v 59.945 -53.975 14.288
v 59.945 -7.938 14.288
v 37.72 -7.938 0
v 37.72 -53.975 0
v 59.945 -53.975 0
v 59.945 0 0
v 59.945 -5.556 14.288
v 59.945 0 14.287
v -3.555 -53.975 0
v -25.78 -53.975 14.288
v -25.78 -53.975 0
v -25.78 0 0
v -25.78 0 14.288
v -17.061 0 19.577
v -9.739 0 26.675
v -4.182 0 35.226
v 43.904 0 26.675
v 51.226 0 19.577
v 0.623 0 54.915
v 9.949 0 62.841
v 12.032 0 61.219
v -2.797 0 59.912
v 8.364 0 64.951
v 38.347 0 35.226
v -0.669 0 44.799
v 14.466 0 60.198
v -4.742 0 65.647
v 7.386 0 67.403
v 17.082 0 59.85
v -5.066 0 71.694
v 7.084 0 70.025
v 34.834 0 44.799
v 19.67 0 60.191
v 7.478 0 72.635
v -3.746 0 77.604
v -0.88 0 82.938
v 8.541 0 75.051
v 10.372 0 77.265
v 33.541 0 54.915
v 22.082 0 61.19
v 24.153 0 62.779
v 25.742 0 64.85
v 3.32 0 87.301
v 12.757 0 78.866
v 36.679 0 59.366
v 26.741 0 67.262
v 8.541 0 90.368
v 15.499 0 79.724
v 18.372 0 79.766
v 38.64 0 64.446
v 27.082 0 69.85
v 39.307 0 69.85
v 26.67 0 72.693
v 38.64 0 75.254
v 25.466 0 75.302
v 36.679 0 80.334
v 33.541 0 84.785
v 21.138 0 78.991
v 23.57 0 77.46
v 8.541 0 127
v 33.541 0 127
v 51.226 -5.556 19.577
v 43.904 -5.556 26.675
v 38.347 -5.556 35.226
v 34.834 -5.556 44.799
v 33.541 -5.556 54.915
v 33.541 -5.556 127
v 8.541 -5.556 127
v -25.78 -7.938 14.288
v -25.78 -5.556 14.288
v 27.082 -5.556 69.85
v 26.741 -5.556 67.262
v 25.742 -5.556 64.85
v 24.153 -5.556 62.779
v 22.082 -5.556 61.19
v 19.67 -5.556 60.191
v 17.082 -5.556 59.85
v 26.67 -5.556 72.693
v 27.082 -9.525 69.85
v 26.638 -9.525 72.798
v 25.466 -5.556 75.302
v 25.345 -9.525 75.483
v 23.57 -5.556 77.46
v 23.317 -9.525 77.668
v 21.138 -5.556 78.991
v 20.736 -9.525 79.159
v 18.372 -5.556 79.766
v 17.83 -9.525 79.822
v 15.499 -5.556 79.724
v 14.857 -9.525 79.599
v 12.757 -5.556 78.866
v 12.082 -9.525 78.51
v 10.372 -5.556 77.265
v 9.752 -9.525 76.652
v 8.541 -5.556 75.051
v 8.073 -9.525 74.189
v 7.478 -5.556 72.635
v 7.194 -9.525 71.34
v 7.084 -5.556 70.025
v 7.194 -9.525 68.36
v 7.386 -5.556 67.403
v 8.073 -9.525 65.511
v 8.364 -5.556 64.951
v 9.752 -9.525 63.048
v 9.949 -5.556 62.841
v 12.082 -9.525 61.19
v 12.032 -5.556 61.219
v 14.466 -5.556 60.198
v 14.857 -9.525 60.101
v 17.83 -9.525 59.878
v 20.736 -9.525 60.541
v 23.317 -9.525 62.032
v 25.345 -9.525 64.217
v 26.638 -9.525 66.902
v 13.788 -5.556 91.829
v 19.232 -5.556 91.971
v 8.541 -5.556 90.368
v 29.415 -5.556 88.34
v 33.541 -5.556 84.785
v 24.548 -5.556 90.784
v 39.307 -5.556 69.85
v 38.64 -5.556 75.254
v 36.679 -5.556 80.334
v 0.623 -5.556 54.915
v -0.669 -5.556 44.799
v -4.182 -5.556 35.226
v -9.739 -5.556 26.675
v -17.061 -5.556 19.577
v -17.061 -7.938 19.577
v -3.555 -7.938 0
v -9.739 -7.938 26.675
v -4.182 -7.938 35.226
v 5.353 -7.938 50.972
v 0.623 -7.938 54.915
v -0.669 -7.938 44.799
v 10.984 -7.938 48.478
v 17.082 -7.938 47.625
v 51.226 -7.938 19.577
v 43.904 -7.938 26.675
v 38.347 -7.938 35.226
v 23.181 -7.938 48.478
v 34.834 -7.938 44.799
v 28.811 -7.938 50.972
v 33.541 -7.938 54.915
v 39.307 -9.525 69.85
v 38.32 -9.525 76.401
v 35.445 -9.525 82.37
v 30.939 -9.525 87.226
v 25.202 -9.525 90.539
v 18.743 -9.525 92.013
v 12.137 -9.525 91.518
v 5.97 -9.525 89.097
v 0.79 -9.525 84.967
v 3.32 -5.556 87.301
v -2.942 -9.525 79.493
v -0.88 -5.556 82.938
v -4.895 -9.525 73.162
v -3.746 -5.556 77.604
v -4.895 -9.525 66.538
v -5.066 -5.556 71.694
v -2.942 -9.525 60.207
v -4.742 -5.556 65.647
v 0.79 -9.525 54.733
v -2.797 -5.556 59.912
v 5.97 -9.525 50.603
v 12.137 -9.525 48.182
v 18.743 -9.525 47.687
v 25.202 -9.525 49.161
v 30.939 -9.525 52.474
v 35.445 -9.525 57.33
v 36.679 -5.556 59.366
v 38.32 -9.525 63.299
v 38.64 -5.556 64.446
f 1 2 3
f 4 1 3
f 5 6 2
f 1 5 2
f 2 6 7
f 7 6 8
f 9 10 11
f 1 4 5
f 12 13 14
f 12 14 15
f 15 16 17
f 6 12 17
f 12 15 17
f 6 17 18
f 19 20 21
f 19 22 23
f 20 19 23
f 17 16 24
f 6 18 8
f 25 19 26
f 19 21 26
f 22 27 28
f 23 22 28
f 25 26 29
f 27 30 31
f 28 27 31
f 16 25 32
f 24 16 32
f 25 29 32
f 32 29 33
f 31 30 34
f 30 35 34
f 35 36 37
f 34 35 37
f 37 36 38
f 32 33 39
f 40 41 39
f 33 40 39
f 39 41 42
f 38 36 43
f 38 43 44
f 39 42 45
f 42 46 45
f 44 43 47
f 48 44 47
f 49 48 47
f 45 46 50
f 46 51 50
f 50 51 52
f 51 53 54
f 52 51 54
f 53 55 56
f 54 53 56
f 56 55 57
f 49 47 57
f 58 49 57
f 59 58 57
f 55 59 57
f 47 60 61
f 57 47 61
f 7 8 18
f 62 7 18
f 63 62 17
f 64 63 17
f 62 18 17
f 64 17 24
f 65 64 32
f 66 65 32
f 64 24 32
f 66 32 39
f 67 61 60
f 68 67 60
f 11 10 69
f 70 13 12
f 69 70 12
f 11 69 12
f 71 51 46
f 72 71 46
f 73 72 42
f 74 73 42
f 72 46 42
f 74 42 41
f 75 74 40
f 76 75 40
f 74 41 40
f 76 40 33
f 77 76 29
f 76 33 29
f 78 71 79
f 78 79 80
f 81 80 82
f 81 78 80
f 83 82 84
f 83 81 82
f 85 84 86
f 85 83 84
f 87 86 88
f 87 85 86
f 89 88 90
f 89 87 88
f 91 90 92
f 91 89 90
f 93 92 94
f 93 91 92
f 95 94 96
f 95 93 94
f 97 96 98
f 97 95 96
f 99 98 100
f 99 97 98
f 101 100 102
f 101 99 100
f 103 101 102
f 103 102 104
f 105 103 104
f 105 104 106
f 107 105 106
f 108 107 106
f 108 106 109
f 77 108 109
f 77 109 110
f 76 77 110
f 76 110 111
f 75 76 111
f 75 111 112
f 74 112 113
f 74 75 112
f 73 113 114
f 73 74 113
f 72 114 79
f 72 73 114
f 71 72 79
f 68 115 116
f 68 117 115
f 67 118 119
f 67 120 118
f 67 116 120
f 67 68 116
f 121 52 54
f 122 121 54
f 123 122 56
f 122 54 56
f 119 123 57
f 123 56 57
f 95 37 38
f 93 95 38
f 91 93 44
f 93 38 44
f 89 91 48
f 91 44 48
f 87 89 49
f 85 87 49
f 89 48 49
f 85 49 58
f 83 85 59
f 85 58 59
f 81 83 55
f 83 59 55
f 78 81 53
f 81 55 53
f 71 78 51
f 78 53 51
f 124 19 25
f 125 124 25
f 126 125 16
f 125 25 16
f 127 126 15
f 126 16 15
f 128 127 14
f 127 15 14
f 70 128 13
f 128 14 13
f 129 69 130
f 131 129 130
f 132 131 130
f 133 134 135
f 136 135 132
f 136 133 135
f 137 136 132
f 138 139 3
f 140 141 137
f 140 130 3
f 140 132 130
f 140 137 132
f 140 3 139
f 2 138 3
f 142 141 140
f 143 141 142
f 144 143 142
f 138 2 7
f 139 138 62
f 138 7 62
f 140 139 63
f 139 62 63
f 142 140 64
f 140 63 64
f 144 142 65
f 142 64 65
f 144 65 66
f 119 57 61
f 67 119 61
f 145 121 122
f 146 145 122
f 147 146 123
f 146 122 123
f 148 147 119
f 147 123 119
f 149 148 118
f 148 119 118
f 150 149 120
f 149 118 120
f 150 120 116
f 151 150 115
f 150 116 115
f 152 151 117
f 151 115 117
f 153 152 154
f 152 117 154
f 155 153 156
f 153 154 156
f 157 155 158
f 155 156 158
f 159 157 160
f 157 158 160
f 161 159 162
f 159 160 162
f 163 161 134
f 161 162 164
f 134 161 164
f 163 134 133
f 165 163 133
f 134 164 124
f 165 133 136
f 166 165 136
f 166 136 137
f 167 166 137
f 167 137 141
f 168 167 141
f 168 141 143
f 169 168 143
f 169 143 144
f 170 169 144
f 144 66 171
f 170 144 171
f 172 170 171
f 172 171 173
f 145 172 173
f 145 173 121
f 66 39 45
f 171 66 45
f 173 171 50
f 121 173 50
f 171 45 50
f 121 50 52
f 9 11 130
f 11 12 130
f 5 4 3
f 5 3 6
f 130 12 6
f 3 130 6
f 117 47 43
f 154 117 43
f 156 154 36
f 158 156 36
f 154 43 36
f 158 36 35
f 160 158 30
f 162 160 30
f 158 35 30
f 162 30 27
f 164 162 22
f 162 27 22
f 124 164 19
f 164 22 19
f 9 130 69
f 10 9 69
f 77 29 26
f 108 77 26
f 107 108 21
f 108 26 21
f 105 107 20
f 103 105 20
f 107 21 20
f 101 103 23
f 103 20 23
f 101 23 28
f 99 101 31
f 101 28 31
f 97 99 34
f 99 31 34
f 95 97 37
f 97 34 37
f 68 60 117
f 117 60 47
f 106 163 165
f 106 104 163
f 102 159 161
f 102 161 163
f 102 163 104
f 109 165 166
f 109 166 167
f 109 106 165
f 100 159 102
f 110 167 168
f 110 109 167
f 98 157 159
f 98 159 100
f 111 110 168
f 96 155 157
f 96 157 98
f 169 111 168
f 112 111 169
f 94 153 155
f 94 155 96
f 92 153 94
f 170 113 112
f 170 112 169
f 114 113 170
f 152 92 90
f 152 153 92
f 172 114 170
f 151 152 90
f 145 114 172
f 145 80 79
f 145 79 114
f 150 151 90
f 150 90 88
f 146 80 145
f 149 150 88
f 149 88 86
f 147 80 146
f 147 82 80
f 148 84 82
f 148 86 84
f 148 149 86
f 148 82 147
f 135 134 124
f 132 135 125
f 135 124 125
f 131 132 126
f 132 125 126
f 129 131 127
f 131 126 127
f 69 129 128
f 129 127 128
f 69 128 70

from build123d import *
from build123d import SkipClean  # not in build123d's __all__

# Parameters (mm, degrees)
F1_DEPTH = 5.55625
F2_R     = 22.225
F2_R_2   = 10.0000054
F3_DEPTH = 3.96875
F5_DEPTH = 2.38125
F7_DEPTH = 46.0375


# Not quite as in the source:
# - after a boolean that leaves OpenCascade's solid faulty, fix() repairs it


with BuildPart() as f1:
    # F0 (on Front) → F1 (new body)
    with BuildSketch(Plane.XZ):
        with BuildLine():
            ThreePointArc((8.5411146283, 90.3682841852), (21.9263912189, 91.5406597383), (33.5411154283, 84.7850490788))
            Line((33.5411154283, 84.7850490788), (33.5411154283, 127))
            Line((33.5411154283, 127), (8.5411146283, 127))
            Line((8.5411146283, 127), (8.5411146283, 90.3682841852))
        make_face()
        with BuildLine():
            ThreePointArc((17.0822292566, 47.625), (26.0827614415, 49.5290491023), (33.5411154283, 54.9149509212))
            Line((33.5411154283, 54.9149509212), (33.5411154283, 84.7850490788))
            ThreePointArc((33.5411154283, 84.7850490788), (21.9263912189, 91.5406597383), (8.5411146283, 90.3682841852))
            Line((8.5411146283, 90.3682841852), (8.5411146283, 75.050910392))
            ThreePointArc((8.5411146283, 75.050910392), (19.7830546485, 79.4783773401), (27.0822346566, 69.85))
            ThreePointArc((27.0822346566, 69.85), (24.1533008869, 62.7789283698), (17.0822292566, 59.8499946))
            Line((17.0822292566, 59.8499946), (17.0822292566, 47.625))
        make_face()
        with BuildLine():
            ThreePointArc((0.6233430849, 54.9149509212), (8.0816970717, 49.5290491023), (17.0822292566, 47.625))
            Line((17.0822292566, 47.625), (17.0822292566, 59.8499946))
            ThreePointArc((17.0822292566, 59.8499946), (8.3641663982, 64.9514810404), (8.5411146283, 75.050910392))
            Line((8.5411146283, 75.050910392), (8.5411146283, 90.3682841852))
            ThreePointArc((8.5411146283, 90.3682841852), (-4.6084304817, 74.6941619623), (0.6233430849, 54.9149509212))
        make_face()
        with BuildLine():
            Line((33.5411154283, 84.7850490788), (33.5411154283, 54.9149509212))
            ThreePointArc((33.5411154283, 54.9149509212), (37.8156487788, 61.8452551623), (39.3072292566, 69.85))
            ThreePointArc((39.3072292566, 69.85), (37.8156487788, 77.8547448377), (33.5411154283, 84.7850490788))
        make_face()
        with BuildLine():
            Line((17.0822292566, 0), (17.0822292566, 47.625))
            ThreePointArc((17.0822292566, 47.625), (8.0816970717, 49.5290491023), (0.6233430849, 54.9149509212))
            ThreePointArc((0.6233430849, 54.9149509212), (-6.7205760102, 30.7942081775), (-25.7802707434, 14.2875))
            Line((-25.7802707434, 14.2875), (-25.7802707434, 0))
            Line((-25.7802707434, 0), (17.0822292566, 0))
        make_face()
        with BuildLine():
            Line((33.5411154283, 0), (33.5411154283, 54.9149509212))
            ThreePointArc((33.5411154283, 54.9149509212), (26.0827614415, 49.5290491023), (17.0822292566, 47.625))
            Line((17.0822292566, 47.625), (17.0822292566, 0))
            Line((17.0822292566, 0), (33.5411154283, 0))
        make_face()
        with BuildLine():
            ThreePointArc((59.9447292566, 14.2875), (40.8850345234, 30.7942081775), (33.5411154283, 54.9149509212))
            Line((33.5411154283, 54.9149509212), (33.5411154283, 0))
            Line((33.5411154283, 0), (59.9447292566, 0))
            Line((59.9447292566, 0), (59.9447292566, 14.2875))
        make_face()
    extrude(amount=F1_DEPTH)

    # F2 (on face) → F3 (join)
    with BuildSketch(Plane.XZ.offset(5.55625)):
        with Locations((17.0822292566, 69.85)):
            Circle(F2_R)
        with Locations((17.0822292566, 69.85)):
            Circle(F2_R_2, mode=Mode.SUBTRACT)
    with SkipClean():  # cleaning this boolean's faces spoils the solid; the shape is the same uncleaned
        extrude(amount=F3_DEPTH)

    # F3_face (on face) + F4 (on face) → F5 (join)
    with BuildSketch(Plane(origin=(17.0822292566, -5.55625, 20.2916476737), x_dir=(1, 0, 0), z_dir=(0, -1, 0))):
        with BuildLine():
            ThreePointArc((16.4588861717, 34.6233032475), (0, 27.3333523263), (-16.4588861717, 34.6233032475))
            ThreePointArc((-16.4588861717, 34.6233032475), (-23.8028052668, 10.5025605039), (-42.8625, -6.0041476737))
            Line((-42.8625, -6.0041476737), (-42.8625, -20.2916476737))
            Line((-42.8625, -20.2916476737), (42.8625, -20.2916476737))
            Line((42.8625, -20.2916476737), (42.8625, -6.0041476737))
            ThreePointArc((42.8625, -6.0041476737), (23.8028052668, 10.5025605039), (16.4588861717, 34.6233032475))
        make_face()
    with BuildSketch(Plane.XZ.offset(5.55625)):
        with BuildLine():
            ThreePointArc((59.9447292566, 14.2875), (40.8850345234, 30.7942081775), (33.5411154283, 54.9149509212))
            ThreePointArc((33.5411154283, 54.9149509212), (17.0822292566, 47.625), (0.6233430849, 54.9149509212))
            ThreePointArc((0.6233430849, 54.9149509212), (-6.7205760102, 30.7942081775), (-25.7802707434, 14.2875))
            Line((-25.7802707434, 14.2875), (-25.7802707434, 0))
            Line((-25.7802707434, 0), (59.9447292566, 0))
            Line((59.9447292566, 0), (59.9447292566, 14.2875))
        make_face()
    extrude(amount=F5_DEPTH)

    add(f1.part.fix(), mode=Mode.REPLACE)

    # F6 (on face) → F7 (join)
    with BuildSketch(Plane.XZ.offset(7.9375)):
        Polygon((-25.7802707434, 14.2875), (-25.7802707434, 0), (-3.5552707434, 0), align=None)
        Polygon((59.9447292566, 14.2875), (37.7197292566, 0), (59.9447292566, 0), align=None)
    extrude(amount=F7_DEPTH)


solid = f1.part
